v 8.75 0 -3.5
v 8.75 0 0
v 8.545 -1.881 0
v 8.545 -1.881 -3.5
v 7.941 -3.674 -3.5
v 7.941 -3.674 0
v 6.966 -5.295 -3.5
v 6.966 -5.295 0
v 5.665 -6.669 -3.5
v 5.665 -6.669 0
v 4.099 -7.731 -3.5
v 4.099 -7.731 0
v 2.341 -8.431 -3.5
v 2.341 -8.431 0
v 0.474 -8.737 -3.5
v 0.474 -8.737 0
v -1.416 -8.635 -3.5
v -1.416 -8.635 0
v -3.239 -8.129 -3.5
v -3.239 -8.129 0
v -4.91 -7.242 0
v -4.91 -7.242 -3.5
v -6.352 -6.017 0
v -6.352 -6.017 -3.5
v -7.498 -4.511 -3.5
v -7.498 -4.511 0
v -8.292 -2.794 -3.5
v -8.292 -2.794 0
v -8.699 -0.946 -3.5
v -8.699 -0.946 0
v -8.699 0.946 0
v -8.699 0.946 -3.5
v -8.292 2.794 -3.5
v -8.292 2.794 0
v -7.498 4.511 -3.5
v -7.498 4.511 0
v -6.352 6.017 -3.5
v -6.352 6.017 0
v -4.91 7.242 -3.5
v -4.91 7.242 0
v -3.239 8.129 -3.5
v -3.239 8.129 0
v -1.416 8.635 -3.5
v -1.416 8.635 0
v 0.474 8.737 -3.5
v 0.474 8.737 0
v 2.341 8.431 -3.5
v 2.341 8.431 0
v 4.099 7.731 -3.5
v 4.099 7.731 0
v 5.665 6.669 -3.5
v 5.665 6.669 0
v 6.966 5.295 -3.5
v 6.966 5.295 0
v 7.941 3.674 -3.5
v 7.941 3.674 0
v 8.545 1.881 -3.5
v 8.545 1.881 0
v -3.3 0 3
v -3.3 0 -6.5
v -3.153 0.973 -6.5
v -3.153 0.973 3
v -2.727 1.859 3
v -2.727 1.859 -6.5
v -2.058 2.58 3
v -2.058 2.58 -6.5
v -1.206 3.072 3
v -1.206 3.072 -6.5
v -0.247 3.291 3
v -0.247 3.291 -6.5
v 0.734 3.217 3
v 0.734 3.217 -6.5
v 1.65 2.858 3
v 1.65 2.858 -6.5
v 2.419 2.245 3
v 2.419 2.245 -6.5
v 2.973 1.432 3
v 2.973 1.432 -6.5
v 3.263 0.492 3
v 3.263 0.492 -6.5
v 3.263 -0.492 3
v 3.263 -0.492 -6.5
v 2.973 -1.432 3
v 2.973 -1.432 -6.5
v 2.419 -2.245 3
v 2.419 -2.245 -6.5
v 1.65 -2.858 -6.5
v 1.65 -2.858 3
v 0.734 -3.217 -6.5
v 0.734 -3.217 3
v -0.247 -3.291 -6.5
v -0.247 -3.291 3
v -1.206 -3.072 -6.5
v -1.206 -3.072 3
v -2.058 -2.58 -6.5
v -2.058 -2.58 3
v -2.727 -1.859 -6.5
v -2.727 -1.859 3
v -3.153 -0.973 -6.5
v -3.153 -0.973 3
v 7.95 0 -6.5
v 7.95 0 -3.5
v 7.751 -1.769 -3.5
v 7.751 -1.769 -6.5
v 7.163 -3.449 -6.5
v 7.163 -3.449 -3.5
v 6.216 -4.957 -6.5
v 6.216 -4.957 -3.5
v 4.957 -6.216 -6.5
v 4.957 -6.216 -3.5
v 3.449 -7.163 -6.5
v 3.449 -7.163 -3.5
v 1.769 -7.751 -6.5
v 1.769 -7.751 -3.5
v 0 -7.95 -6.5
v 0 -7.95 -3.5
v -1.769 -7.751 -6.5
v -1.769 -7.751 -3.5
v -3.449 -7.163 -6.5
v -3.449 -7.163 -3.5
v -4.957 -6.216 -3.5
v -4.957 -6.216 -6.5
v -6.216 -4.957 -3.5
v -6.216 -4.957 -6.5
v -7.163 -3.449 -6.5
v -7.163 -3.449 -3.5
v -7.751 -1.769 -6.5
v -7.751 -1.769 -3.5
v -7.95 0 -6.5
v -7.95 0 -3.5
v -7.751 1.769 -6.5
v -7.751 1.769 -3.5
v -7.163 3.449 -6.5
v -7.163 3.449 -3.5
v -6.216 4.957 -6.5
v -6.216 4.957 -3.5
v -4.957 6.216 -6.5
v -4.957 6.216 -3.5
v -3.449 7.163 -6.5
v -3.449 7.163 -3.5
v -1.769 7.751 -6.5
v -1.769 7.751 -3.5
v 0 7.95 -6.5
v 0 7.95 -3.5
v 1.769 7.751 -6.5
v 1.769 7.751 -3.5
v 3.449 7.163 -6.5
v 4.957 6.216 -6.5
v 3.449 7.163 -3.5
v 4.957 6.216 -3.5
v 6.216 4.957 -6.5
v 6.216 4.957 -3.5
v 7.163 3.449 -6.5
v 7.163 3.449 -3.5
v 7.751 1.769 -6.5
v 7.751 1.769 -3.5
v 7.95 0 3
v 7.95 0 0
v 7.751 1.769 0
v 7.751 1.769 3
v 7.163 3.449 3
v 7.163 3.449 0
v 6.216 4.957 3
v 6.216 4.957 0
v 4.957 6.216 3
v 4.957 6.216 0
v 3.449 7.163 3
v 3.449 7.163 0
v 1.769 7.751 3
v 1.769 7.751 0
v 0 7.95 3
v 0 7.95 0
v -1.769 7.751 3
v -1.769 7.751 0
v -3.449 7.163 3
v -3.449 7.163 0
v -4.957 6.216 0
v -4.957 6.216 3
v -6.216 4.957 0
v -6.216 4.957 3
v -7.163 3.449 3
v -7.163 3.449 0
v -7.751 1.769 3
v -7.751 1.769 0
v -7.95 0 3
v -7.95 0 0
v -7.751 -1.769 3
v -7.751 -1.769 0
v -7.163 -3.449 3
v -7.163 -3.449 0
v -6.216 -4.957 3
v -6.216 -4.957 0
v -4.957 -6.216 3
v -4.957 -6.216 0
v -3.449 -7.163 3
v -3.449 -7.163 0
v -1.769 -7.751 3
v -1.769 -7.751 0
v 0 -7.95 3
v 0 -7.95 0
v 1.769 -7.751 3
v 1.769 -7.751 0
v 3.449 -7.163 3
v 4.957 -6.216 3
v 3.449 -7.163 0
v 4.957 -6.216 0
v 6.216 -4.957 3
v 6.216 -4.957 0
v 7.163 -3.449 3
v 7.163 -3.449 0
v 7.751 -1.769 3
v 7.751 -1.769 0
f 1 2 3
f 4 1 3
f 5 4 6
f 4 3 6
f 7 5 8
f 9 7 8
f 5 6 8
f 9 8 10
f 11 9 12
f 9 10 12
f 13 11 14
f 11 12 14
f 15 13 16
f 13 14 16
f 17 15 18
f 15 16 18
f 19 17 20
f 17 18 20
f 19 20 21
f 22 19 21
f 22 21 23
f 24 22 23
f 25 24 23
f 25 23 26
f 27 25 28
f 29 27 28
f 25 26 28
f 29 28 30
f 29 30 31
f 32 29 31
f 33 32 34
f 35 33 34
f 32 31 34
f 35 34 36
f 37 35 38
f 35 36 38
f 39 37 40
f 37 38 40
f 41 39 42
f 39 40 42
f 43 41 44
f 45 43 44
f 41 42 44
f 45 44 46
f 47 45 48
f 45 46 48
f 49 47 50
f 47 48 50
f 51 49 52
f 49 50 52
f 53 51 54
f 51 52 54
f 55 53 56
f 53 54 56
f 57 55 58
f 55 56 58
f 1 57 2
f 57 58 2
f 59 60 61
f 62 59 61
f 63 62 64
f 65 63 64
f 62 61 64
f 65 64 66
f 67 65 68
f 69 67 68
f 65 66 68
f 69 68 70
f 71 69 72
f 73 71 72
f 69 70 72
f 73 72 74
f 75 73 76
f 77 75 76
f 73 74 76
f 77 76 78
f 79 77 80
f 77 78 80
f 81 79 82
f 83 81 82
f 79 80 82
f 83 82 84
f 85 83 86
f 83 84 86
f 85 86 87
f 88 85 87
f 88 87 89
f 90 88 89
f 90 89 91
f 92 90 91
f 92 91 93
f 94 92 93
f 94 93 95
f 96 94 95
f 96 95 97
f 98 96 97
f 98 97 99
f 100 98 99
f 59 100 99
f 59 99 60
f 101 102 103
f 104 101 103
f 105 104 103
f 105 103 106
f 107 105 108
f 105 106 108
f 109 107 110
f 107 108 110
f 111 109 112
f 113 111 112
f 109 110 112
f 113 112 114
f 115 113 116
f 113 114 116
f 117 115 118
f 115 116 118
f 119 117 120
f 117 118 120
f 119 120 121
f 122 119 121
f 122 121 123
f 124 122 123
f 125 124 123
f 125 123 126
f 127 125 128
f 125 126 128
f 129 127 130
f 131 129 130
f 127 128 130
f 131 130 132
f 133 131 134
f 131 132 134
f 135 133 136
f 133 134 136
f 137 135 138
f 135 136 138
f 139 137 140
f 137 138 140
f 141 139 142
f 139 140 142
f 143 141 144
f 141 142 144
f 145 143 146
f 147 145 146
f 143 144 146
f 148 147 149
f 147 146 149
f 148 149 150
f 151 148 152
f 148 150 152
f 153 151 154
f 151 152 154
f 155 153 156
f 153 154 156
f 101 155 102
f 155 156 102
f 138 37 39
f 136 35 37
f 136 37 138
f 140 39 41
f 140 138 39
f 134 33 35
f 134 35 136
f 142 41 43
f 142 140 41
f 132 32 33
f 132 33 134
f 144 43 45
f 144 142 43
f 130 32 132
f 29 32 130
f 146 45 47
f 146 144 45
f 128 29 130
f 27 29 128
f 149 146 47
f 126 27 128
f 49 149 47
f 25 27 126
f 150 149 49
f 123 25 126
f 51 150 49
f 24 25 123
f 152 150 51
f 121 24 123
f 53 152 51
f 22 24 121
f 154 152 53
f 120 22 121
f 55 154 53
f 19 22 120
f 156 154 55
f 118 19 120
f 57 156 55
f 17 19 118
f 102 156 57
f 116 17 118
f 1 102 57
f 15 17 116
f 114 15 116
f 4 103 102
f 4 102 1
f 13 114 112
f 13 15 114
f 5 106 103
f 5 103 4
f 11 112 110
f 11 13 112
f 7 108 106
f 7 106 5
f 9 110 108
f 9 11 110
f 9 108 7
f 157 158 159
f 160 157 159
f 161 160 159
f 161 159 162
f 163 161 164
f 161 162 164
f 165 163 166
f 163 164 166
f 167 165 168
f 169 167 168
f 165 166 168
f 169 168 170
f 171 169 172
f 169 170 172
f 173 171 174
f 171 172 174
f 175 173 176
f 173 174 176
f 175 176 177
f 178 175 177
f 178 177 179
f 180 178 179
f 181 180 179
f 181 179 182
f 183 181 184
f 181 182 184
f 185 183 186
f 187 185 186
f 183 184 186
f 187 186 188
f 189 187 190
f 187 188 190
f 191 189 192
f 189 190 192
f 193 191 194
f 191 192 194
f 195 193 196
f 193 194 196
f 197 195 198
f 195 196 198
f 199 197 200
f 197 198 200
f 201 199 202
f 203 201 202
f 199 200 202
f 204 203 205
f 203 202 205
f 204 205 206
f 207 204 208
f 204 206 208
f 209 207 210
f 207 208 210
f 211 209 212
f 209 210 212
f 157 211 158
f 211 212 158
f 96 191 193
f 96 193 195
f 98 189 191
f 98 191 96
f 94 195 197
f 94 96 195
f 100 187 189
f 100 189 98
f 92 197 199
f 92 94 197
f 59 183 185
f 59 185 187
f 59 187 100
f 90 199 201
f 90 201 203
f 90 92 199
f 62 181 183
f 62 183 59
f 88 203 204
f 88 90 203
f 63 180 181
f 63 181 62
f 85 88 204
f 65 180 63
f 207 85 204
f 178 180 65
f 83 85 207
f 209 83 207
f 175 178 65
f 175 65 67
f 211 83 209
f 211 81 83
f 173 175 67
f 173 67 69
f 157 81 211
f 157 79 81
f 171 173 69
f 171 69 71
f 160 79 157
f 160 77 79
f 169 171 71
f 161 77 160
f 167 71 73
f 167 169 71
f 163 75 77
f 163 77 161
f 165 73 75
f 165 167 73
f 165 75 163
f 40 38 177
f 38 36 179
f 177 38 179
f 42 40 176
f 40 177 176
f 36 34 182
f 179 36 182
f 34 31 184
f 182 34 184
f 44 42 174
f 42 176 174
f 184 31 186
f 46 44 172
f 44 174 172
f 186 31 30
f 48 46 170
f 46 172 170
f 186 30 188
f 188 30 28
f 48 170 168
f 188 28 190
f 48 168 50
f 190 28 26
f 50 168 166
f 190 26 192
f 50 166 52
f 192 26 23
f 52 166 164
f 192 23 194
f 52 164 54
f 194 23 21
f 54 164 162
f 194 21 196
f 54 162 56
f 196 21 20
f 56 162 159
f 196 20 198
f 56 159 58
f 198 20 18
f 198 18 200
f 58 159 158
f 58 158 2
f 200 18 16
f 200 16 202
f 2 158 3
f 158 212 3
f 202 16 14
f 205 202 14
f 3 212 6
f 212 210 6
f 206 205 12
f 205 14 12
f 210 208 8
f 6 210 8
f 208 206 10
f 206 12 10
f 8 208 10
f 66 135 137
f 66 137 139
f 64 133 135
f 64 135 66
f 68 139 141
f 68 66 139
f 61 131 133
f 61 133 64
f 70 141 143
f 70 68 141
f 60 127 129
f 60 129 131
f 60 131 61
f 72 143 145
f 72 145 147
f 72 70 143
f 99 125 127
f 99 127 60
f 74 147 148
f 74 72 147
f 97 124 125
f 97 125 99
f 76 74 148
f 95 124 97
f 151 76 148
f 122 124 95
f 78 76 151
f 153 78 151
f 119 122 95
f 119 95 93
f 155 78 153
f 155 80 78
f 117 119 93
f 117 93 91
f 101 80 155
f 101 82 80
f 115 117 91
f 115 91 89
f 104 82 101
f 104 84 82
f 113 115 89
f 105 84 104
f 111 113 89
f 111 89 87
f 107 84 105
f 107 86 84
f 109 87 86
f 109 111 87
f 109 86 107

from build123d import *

# Parameters (mm, degrees)
F0_R     = 7.95
F1_DEPTH = 3
F2_R     = 8.75
F3_DEPTH = 3.5
F4_R     = 7.95
F5_DEPTH = 3
F7_D     = 6.6


with BuildPart() as f1:
    # F0 (on Top) → F1 (new body)
    with BuildSketch(Plane.XY):
        Circle(F0_R)
    extrude(amount=F1_DEPTH)

    # F2 (on face) → F3 (join)
    with BuildSketch(Plane(origin=(0, 0, 0), x_dir=(1, 0, 0), z_dir=(0, 0, -1))):
        Circle(F2_R)
    extrude(amount=F3_DEPTH)

    # F4 (on face) → F5 (join)
    with BuildSketch(Plane(origin=(0, 0, -3.5), x_dir=(1, 0, 0), z_dir=(0, 0, -1))):
        Circle(F4_R)
    extrude(amount=F5_DEPTH)

    # F7 (through all)
    with Locations(Plane.XY.offset(3)):
        with Locations((0, 0)):
            Hole(F7_D / 2)


solid = f1.part
